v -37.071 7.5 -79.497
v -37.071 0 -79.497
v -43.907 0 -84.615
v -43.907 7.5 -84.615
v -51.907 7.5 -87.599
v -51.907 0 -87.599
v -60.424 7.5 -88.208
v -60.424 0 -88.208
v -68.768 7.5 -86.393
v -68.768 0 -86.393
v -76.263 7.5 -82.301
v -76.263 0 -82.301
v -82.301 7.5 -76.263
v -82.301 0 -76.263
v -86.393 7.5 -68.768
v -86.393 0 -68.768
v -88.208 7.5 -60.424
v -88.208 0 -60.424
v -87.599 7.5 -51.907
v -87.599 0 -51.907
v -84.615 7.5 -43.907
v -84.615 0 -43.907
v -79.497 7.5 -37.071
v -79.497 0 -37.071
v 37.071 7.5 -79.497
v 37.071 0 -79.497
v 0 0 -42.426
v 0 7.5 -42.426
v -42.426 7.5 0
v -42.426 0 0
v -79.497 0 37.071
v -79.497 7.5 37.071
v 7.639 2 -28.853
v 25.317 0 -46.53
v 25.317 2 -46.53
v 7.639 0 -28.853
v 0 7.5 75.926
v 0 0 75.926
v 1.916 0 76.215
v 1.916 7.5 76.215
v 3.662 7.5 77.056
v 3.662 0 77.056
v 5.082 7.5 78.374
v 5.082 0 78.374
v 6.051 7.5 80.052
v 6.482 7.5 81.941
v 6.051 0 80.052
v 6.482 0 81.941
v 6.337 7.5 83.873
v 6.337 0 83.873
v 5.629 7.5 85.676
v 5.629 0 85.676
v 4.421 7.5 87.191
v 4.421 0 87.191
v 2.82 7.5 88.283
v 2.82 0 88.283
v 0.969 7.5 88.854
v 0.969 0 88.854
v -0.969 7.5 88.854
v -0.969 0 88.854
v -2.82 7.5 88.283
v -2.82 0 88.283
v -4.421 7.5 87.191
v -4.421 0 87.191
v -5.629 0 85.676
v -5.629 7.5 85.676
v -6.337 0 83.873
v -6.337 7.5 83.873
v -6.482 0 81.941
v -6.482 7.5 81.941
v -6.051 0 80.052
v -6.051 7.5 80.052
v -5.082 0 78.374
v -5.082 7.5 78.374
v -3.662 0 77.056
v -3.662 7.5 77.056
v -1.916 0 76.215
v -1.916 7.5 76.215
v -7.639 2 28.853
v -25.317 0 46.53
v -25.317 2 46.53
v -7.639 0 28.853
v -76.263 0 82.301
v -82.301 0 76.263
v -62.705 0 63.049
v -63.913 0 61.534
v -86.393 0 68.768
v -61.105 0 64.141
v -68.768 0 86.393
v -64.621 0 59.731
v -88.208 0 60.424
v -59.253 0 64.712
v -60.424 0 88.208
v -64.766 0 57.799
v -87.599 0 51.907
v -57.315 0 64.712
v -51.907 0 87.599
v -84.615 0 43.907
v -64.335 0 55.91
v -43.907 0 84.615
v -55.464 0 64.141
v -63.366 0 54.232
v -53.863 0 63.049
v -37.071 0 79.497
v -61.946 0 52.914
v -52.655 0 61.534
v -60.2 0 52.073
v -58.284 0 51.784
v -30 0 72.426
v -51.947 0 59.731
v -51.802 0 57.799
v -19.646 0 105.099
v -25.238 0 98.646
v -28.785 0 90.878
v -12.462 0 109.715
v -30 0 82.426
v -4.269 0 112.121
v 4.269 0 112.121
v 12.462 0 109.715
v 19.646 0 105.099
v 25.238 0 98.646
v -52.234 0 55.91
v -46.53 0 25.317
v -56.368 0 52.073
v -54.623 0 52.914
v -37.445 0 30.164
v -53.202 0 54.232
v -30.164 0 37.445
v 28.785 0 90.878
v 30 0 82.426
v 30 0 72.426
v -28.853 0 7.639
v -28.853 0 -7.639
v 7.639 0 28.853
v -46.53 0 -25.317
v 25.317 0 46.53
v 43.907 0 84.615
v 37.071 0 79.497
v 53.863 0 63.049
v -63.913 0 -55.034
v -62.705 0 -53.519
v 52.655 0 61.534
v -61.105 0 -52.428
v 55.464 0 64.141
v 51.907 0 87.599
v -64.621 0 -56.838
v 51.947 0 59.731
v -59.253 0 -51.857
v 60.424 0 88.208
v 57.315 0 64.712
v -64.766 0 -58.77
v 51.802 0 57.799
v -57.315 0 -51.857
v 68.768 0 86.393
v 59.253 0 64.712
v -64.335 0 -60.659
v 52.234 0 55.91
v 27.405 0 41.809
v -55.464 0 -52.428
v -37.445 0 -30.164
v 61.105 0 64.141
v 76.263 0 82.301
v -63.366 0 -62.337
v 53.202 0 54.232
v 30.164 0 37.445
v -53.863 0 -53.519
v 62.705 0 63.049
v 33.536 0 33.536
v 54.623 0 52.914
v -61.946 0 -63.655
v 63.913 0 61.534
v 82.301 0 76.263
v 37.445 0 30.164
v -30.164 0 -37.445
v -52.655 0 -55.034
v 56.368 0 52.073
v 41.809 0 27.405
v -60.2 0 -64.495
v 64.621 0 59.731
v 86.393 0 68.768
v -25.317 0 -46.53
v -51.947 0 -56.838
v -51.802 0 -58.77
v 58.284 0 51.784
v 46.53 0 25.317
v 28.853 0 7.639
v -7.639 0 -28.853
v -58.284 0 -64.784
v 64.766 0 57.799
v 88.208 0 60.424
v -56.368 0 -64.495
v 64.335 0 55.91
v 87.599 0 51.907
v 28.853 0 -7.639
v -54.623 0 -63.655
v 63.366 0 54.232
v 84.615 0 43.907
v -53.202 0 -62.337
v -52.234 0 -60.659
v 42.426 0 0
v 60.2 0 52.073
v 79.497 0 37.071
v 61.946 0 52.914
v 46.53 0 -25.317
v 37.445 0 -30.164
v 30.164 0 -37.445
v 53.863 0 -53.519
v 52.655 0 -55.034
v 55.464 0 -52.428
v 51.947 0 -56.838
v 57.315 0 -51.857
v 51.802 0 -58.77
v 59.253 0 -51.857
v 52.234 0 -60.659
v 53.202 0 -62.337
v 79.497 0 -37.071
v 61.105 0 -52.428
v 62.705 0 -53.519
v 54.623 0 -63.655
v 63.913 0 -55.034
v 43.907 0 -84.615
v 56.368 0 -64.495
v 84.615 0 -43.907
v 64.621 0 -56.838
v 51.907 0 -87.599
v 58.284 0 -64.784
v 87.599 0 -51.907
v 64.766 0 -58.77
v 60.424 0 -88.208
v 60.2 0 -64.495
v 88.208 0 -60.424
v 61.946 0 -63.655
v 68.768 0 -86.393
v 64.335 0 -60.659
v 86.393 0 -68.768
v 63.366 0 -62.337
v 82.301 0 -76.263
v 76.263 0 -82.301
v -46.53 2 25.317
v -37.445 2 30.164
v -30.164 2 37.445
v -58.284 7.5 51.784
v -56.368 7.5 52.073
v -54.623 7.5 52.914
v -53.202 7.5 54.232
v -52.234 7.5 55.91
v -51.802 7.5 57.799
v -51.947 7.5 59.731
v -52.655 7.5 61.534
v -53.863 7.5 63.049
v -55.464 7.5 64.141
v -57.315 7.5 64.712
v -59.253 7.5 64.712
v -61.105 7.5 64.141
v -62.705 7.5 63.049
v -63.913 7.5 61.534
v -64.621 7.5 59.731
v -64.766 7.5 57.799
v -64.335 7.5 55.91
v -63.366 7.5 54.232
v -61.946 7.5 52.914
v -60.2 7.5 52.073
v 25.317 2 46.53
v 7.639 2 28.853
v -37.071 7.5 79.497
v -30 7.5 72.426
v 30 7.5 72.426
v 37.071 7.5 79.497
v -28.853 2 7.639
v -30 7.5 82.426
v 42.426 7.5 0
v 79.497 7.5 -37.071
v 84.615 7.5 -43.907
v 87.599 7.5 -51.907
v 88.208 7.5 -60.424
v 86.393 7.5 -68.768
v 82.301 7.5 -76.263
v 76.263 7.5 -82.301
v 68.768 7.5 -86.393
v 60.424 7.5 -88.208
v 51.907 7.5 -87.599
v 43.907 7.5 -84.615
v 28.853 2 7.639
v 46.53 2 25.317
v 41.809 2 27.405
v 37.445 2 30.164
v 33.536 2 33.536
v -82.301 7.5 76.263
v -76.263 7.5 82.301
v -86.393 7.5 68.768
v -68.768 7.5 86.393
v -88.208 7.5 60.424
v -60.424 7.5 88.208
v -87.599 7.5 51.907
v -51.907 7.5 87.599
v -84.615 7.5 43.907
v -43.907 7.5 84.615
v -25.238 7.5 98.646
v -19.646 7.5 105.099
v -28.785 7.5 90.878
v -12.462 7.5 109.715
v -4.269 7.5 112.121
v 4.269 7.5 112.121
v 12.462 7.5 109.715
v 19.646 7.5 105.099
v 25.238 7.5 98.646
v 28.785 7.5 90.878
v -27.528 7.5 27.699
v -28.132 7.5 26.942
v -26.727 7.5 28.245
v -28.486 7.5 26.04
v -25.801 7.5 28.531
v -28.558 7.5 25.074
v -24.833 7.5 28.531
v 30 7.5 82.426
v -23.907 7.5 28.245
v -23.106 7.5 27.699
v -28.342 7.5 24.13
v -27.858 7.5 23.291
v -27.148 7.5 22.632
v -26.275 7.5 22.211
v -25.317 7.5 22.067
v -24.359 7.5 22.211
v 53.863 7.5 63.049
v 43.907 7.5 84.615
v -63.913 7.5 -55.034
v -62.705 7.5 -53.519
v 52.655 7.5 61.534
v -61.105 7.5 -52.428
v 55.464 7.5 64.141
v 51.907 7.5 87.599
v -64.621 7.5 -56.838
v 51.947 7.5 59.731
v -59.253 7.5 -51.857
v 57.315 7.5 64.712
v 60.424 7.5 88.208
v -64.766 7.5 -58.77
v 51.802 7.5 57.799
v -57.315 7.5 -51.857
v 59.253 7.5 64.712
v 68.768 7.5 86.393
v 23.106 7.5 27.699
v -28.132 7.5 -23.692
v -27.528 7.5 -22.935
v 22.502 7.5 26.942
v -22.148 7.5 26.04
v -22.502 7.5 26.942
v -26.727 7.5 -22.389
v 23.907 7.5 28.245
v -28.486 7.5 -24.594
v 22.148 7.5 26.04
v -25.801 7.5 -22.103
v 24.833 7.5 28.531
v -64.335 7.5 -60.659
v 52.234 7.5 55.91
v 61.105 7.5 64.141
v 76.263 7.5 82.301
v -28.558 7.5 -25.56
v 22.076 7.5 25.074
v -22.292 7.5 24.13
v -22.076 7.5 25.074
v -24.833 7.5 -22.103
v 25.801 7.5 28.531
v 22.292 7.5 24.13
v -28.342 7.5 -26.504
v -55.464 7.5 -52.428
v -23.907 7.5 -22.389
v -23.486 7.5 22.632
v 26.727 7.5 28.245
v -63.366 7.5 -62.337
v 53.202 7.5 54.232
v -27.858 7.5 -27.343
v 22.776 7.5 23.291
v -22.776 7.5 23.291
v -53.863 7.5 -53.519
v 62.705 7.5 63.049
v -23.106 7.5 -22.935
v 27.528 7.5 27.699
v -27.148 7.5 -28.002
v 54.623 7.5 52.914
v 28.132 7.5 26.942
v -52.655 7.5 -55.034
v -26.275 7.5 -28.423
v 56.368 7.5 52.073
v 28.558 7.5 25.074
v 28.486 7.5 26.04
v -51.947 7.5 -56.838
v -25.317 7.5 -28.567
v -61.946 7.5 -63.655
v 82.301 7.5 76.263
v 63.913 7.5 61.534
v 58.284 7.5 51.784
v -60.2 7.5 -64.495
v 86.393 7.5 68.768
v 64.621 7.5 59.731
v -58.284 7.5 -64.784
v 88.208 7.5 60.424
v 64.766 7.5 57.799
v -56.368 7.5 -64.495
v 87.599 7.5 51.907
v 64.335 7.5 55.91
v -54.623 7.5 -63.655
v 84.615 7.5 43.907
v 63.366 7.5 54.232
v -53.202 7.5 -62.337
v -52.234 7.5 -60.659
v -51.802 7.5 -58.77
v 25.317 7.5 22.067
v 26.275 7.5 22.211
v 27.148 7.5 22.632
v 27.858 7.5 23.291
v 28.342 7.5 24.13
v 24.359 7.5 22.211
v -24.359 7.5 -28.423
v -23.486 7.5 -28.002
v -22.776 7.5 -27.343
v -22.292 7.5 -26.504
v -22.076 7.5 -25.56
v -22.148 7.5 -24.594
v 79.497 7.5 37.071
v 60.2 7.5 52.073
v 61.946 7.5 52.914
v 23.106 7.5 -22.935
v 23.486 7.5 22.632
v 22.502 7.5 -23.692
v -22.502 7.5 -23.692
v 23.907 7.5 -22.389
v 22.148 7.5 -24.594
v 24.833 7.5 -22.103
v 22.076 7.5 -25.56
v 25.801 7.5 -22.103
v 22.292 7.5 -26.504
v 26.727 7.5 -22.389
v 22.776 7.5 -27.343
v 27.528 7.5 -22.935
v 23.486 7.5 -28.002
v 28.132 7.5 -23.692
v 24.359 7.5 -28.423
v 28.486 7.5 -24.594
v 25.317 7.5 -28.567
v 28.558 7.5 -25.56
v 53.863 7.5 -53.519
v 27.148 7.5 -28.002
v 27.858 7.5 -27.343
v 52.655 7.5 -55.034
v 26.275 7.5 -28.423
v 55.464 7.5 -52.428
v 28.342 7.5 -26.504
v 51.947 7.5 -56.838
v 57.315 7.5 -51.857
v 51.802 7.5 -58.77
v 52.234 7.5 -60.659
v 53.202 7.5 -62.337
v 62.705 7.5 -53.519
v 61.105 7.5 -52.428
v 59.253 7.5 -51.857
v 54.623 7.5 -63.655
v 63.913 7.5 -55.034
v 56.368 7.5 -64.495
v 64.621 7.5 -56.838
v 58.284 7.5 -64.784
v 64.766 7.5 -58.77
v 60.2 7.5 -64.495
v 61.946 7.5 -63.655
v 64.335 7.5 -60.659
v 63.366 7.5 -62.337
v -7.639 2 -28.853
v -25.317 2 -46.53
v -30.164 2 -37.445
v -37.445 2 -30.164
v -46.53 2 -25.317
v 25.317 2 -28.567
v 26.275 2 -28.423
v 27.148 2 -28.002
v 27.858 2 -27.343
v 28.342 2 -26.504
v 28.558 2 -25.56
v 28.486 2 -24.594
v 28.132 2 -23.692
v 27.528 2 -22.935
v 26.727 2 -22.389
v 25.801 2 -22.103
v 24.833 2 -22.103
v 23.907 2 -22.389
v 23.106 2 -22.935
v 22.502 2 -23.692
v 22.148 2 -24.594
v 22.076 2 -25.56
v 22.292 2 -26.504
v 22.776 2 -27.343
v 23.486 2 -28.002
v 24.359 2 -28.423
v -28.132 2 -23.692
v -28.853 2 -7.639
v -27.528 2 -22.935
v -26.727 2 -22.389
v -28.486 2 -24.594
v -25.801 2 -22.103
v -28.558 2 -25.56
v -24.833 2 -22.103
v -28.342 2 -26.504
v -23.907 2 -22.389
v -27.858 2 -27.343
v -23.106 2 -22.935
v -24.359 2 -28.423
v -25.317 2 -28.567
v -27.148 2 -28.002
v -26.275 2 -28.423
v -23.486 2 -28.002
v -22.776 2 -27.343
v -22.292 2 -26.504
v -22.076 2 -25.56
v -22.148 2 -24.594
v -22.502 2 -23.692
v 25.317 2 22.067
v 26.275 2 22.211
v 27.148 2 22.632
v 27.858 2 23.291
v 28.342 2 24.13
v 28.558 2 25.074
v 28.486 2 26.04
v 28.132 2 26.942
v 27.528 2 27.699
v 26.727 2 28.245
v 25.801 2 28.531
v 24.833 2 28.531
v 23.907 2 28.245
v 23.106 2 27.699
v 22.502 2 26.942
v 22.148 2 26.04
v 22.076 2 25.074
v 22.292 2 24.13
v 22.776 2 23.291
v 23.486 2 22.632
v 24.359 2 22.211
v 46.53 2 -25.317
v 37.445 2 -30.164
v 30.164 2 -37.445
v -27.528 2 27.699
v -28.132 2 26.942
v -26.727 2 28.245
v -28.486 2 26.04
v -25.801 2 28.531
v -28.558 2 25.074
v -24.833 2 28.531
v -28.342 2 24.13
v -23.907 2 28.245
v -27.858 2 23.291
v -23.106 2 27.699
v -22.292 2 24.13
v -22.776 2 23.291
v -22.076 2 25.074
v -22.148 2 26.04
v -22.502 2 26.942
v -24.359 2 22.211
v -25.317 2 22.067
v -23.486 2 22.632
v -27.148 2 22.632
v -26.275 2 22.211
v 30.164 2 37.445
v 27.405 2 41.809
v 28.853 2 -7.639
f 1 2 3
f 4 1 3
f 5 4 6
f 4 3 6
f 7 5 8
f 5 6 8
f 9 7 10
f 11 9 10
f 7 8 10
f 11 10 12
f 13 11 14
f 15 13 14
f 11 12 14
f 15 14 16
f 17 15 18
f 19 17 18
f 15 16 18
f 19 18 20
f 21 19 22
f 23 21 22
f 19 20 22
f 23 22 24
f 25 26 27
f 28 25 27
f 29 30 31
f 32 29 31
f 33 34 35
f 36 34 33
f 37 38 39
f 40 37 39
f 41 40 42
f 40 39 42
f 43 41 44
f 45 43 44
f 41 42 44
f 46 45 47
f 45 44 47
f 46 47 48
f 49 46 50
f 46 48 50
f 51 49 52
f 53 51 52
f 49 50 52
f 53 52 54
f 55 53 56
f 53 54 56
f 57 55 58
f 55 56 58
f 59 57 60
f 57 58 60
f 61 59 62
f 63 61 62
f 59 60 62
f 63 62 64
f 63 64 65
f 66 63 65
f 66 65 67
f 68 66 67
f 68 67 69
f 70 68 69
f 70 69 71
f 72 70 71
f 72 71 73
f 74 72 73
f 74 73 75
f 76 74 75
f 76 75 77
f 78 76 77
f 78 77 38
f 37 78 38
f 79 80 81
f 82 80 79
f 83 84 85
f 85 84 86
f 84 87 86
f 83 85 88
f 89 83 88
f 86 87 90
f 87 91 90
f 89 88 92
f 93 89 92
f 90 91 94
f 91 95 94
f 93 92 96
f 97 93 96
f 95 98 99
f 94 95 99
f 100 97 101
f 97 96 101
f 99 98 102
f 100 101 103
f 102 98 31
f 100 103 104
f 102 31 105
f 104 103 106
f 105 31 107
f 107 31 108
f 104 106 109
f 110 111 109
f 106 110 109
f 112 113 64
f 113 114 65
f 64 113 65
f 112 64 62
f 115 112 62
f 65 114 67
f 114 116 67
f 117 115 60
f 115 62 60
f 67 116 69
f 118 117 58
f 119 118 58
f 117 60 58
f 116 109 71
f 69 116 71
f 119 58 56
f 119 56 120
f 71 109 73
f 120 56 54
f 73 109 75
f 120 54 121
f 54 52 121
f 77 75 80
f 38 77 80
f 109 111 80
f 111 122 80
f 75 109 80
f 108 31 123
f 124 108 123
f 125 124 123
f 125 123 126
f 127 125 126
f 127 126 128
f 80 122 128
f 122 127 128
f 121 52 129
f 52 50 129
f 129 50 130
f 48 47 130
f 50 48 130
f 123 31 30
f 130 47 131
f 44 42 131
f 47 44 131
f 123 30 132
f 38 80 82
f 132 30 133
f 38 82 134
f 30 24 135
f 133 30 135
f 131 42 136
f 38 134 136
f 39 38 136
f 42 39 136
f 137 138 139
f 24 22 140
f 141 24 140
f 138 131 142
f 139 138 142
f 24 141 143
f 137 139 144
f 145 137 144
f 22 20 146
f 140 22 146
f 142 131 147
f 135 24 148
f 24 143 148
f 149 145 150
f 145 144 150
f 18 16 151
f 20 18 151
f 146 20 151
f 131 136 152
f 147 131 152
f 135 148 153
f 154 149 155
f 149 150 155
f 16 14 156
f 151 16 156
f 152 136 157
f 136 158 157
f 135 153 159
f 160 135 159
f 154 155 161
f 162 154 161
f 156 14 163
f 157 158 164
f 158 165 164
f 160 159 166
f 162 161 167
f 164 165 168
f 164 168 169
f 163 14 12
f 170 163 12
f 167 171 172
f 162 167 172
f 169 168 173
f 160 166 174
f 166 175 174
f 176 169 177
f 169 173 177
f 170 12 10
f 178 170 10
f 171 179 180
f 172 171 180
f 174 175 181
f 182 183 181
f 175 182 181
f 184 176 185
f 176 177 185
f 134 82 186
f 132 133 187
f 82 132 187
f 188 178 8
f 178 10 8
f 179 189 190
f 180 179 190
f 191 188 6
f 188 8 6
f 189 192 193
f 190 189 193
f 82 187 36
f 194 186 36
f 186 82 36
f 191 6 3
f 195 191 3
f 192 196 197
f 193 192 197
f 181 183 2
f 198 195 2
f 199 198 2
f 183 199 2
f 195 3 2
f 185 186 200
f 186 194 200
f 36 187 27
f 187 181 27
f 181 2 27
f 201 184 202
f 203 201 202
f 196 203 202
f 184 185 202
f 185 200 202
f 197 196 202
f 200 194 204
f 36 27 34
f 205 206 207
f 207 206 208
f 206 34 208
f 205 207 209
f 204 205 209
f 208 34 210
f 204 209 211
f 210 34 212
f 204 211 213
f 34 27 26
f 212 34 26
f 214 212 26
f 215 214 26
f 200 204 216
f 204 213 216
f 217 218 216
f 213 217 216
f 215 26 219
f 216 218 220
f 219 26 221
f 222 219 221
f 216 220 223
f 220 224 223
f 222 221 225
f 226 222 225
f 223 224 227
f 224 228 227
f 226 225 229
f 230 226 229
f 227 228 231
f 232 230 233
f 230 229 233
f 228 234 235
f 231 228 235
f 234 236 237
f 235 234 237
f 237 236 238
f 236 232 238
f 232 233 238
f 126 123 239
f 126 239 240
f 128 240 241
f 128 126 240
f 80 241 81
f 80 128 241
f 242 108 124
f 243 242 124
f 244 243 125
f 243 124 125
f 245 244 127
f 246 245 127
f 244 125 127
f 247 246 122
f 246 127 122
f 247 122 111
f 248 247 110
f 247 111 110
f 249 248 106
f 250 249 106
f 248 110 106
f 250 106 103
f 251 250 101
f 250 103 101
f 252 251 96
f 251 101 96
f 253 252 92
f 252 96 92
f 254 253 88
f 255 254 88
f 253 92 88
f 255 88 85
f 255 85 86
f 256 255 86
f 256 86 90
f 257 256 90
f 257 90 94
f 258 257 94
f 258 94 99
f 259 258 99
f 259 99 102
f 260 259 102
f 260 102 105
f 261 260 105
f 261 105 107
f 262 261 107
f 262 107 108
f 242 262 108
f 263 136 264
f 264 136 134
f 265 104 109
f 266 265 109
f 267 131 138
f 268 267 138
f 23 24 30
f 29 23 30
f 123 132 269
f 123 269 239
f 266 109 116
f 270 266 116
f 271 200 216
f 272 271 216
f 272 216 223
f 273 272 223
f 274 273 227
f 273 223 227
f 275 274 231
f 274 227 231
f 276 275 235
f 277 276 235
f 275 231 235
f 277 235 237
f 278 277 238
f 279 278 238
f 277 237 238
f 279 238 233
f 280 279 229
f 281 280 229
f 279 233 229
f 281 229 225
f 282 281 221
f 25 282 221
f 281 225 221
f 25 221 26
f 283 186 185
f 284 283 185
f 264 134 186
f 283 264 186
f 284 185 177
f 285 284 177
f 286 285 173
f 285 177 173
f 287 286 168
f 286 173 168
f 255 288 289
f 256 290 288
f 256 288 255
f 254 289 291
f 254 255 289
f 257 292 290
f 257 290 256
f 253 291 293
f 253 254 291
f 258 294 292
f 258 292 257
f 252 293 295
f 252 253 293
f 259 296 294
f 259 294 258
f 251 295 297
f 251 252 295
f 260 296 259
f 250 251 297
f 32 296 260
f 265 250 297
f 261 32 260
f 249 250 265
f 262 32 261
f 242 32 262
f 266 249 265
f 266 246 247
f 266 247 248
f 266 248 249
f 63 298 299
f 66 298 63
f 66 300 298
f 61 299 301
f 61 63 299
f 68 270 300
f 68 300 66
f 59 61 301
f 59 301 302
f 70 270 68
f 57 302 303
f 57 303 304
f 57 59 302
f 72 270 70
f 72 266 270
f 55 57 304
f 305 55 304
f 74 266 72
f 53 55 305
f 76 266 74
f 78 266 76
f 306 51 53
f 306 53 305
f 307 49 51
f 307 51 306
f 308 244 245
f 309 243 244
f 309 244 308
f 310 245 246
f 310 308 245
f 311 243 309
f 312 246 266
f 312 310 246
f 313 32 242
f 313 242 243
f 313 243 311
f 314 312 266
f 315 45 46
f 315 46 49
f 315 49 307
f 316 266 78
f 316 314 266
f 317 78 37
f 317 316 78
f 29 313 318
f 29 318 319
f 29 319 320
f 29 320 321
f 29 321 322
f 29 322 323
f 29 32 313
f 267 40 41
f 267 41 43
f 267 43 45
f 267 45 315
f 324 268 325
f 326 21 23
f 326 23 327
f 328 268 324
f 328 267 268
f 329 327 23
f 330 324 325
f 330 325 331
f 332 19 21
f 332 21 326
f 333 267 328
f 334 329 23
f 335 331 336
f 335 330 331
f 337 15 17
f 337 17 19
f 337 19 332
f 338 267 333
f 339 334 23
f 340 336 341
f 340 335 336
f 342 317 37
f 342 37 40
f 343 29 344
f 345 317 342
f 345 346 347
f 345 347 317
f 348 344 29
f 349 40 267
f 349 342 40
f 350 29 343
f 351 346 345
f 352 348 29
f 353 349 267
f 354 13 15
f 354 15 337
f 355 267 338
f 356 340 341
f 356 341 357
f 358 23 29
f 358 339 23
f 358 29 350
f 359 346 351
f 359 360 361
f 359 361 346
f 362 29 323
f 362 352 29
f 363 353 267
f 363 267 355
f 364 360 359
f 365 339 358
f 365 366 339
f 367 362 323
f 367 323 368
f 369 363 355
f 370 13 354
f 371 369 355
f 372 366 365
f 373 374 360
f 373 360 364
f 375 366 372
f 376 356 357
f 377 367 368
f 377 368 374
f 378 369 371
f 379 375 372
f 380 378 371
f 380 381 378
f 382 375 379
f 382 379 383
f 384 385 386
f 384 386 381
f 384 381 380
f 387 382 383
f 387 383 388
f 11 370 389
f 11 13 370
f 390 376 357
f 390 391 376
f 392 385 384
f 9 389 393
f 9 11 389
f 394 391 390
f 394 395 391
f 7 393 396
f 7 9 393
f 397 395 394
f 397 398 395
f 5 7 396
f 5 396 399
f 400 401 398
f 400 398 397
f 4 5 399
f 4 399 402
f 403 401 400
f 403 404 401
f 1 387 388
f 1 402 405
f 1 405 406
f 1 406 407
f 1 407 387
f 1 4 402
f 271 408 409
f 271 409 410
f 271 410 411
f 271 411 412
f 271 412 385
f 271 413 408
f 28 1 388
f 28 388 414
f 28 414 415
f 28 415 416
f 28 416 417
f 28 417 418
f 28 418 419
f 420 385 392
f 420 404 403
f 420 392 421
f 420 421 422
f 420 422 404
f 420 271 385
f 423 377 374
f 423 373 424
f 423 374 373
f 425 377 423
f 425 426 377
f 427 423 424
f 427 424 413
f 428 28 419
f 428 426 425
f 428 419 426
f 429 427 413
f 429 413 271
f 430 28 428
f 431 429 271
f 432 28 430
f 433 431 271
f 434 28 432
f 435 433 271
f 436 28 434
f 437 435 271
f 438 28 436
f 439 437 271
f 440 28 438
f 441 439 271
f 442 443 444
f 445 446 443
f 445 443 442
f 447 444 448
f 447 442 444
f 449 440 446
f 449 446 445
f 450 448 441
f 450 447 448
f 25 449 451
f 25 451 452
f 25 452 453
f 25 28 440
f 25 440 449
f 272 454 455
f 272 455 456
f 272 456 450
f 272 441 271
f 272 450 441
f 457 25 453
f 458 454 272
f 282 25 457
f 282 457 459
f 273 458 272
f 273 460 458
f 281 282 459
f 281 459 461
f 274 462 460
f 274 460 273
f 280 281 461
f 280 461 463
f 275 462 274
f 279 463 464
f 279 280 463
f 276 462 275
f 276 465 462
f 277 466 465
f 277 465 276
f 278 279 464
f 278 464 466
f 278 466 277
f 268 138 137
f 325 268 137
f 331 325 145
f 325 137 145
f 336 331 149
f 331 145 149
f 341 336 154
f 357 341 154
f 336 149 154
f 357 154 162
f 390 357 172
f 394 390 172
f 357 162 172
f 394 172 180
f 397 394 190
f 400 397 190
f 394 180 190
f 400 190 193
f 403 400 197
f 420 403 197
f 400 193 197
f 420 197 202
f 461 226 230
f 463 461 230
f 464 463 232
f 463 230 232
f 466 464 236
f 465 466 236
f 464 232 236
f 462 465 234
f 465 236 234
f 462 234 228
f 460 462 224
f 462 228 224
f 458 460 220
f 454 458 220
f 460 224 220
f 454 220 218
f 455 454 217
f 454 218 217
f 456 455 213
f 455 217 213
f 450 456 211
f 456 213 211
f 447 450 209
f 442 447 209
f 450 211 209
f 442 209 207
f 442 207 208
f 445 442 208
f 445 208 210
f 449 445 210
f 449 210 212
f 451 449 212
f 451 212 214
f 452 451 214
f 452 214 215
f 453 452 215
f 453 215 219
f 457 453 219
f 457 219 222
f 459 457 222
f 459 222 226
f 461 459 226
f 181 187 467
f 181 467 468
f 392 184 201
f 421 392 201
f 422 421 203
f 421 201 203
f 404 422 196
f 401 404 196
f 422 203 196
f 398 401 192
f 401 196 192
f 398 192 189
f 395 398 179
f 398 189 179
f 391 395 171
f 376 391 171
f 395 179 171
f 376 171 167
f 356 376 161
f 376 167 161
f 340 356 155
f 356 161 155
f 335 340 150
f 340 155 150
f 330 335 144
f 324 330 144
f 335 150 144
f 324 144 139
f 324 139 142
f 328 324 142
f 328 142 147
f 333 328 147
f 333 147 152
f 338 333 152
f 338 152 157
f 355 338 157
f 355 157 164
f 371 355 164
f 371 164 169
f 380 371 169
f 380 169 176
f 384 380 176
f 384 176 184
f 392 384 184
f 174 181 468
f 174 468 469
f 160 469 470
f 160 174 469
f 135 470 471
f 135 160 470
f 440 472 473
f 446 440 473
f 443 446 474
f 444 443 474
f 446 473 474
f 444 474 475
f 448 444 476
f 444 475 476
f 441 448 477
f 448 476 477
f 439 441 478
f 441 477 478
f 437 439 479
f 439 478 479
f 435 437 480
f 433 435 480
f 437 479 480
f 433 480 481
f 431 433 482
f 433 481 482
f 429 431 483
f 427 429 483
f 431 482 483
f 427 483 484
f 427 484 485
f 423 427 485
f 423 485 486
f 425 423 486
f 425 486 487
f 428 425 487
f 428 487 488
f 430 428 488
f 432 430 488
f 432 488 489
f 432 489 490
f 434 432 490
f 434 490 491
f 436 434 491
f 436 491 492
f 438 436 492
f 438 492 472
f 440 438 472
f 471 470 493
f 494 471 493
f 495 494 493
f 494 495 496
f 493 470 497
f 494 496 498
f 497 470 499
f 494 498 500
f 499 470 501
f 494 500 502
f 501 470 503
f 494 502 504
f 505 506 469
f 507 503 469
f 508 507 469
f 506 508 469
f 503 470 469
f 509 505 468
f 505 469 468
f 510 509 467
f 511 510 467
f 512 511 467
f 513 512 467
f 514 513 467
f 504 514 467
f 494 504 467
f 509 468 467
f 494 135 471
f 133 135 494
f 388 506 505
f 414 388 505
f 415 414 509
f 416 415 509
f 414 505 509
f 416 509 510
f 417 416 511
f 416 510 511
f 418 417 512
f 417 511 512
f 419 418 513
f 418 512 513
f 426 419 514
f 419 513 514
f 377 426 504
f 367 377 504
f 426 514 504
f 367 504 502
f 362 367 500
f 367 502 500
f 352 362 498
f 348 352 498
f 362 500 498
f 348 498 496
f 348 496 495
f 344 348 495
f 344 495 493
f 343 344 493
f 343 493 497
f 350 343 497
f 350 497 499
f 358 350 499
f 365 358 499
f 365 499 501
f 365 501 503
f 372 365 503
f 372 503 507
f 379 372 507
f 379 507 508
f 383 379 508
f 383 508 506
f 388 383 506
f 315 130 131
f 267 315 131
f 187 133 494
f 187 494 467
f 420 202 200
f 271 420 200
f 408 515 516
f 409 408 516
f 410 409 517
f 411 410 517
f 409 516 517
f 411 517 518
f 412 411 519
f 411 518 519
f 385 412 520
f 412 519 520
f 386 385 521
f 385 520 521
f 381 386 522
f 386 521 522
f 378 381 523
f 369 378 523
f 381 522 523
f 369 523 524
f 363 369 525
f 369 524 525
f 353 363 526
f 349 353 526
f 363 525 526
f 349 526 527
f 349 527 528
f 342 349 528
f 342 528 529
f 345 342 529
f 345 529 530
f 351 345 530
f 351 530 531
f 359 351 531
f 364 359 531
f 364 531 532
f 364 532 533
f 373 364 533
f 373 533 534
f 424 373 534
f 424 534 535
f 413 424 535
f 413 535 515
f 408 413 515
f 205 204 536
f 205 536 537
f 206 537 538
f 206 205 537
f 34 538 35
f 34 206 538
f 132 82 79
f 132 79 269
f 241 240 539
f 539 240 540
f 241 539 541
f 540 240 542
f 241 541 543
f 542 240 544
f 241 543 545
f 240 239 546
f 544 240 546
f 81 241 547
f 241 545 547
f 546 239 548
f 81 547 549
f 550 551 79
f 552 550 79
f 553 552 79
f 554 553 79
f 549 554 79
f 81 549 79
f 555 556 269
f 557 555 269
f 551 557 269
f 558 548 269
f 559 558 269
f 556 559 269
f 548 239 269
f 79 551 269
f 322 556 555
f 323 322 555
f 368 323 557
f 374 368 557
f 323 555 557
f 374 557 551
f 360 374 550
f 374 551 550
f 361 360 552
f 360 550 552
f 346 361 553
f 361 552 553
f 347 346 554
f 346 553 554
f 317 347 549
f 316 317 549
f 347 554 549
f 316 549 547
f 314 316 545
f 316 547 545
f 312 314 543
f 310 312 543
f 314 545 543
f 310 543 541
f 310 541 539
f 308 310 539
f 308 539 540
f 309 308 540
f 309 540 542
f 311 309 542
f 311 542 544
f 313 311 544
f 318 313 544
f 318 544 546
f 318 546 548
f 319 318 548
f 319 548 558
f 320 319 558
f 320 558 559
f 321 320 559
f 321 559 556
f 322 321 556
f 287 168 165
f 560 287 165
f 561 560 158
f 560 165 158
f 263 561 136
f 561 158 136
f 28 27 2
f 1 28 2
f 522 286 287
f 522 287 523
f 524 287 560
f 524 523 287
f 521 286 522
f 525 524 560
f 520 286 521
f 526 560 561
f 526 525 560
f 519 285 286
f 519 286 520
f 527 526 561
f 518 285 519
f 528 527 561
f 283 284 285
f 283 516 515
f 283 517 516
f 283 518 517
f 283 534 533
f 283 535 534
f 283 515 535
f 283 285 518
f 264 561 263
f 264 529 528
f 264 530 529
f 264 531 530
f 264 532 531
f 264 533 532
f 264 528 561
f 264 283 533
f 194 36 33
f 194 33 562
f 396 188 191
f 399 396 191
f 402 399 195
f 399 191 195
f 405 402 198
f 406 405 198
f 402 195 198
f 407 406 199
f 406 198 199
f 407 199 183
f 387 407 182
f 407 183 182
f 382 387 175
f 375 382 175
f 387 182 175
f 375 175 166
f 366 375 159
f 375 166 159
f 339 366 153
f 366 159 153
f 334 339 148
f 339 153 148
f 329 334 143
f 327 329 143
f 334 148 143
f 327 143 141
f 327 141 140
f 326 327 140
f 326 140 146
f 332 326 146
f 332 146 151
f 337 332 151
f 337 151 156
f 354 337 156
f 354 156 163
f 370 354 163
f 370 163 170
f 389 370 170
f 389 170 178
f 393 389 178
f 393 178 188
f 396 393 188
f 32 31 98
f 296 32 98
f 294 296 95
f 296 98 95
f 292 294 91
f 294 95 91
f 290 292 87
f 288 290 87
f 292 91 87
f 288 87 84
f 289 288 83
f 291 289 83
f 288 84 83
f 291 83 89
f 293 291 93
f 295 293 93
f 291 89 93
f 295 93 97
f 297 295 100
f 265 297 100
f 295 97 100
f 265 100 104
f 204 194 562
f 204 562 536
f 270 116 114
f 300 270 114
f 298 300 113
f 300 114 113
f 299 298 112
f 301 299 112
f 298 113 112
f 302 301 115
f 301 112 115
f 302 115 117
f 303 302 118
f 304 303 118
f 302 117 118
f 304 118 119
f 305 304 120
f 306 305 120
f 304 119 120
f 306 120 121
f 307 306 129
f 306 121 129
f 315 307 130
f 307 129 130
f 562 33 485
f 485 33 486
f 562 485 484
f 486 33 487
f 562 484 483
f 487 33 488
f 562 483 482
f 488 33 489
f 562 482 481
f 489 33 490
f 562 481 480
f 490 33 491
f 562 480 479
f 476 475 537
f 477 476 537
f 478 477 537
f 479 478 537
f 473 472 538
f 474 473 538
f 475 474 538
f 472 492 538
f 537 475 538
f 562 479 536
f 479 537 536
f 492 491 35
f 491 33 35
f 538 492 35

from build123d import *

# Parameters (mm, degrees)
BOSS_EXTRU_1_DEPTH      = 7.5
ENL_V_MAT_EXTRU_1_DEPTH = 2
ESQUISSE5_R             = 3.25
ENL_V_MAT_EXTRU_2_DEPTH = 144.052645944
ESQUISSE7_R             = 6.5
ENL_V_MAT_EXTRU_3_DEPTH = 144.143492733


with BuildPart() as part:
    # Esquisse2 → Boss.-Extru.1 (new body)
    with BuildSketch(Plane(origin=(0, 0, 0), x_dir=(1, 0, 0), z_dir=(0, 1, 0))):
        with BuildLine():
            Line((79.497474683, -37.071067812), (42.426406871, 0))
            Line((42.426406871, 0), (79.497474683, 37.071067812))
            ThreePointArc((79.497474683, 37.071067812), (79.497474683, 79.497474683), (37.071067812, 79.497474683))
            Line((37.071067812, 79.497474683), (0, 42.426406871))
            Line((0, 42.426406871), (-37.071067812, 79.497474683))
            ThreePointArc((-37.071067812, 79.497474683), (-79.497474683, 79.497474683), (-79.497474683, 37.071067812))
            Line((-79.497474683, 37.071067812), (-42.426406871, 0))
            Line((-42.426406871, 0), (-79.497474683, -37.071067812))
            ThreePointArc((-79.497474683, -37.071067812), (-79.497474683, -79.497474683), (-37.071067812, -79.497474683))
            Line((-37.071067812, -79.497474683), (-30, -72.426406871))
            Line((-30, -72.426406871), (-30, -82.426406871))
            ThreePointArc((-30, -82.426406871), (0, -112.426406871), (30, -82.426406871))
            Line((30, -82.426406871), (30, -72.426406871))
            Line((30, -72.426406871), (37.071067812, -79.497474683))
            ThreePointArc((37.071067812, -79.497474683), (79.497474683, -79.497474683), (79.497474683, -37.071067812))
        make_face()
    extrude(amount=BOSS_EXTRU_1_DEPTH)

    # Esquisse4 → Enlèv. mat.-Extru.1 (cut)
    with BuildSketch(Plane(origin=(0, 0, 0), x_dir=(-1, 0, 0), z_dir=(0, -1, 0))):
        with BuildLine():
            Line((-33.535533906, -33.535533906), (-18.245921943, -18.245921943))
            Line((-18.245921943, -18.245921943), (-28.852523661, -7.639320225))
            Line((-28.852523661, -7.639320225), (-46.53019319, -25.316989755))
            ThreePointArc((-46.53019319, -25.316989755), (-39.575984314, -28.703872332), (-33.535533906, -33.535533906))
        make_face()
        with BuildLine():
            Line((-7.639320225, -28.852523661), (-18.245921943, -18.245921943))
            Line((-18.245921943, -18.245921943), (-33.535533906, -33.535533906))
            ThreePointArc((-33.535533906, -33.535533906), (-28.703872332, -39.575984314), (-25.316989755, -46.53019319))
            Line((-25.316989755, -46.53019319), (-7.639320225, -28.852523661))
        make_face()
        with BuildLine():
            ThreePointArc((-46.53019319, 25.316989755), (-33.535533906, 33.535533906), (-25.316989755, 46.53019319))
            Line((-25.316989755, 46.53019319), (-7.639320225, 28.852523661))
            Line((-7.639320225, 28.852523661), (-28.852523661, 7.639320225))
            Line((-28.852523661, 7.639320225), (-46.53019319, 25.316989755))
        make_face()
        with BuildLine():
            ThreePointArc((25.316989755, 46.53019319), (33.535533906, 33.535533906), (46.53019319, 25.316989755))
            Line((46.53019319, 25.316989755), (28.852523661, 7.639320225))
            Line((28.852523661, 7.639320225), (7.639320225, 28.852523661))
            Line((7.639320225, 28.852523661), (25.316989755, 46.53019319))
        make_face()
        with BuildLine():
            ThreePointArc((46.53019319, -25.316989755), (33.535533906, -33.535533906), (25.316989755, -46.53019319))
            Line((25.316989755, -46.53019319), (7.639320225, -28.852523661))
            Line((7.639320225, -28.852523661), (28.852523661, -7.639320225))
            Line((28.852523661, -7.639320225), (46.53019319, -25.316989755))
        make_face()
    extrude(amount=-ENL_V_MAT_EXTRU_1_DEPTH, mode=Mode.SUBTRACT)

    # Esquisse5 → Enlèv. mat.-Extru.2 (cut, through all)
    with BuildSketch(Plane(origin=(0, 2, 0), x_dir=(-1, 0, 0), z_dir=(0, -1, 0))):
        with Locations(Location((-25.316989755, -25.316989755, 0), (0, 0, 90))):
            Circle(ESQUISSE5_R)
        with Locations(Location((-25.316989755, 25.316989755, 0), (0, 0, 90))):
            Circle(ESQUISSE5_R)
        with Locations(Location((25.316989755, 25.316989755, 0), (0, 0, 90))):
            Circle(ESQUISSE5_R)
        with Locations(Location((25.316989755, -25.316989755, 0), (0, 0, 90))):
            Circle(ESQUISSE5_R)
    extrude(amount=-ENL_V_MAT_EXTRU_2_DEPTH, mode=Mode.SUBTRACT)

    # Esquisse7 → Enlèv. mat.-Extru.3 (cut, through all)
    with BuildSketch(Plane(origin=(0, 0, 0), x_dir=(-1, 0, 0), z_dir=(0, -1, 0))):
        with Locations(Location((0, -82.426406871, 0), (0, 0, 90))):
            Circle(ESQUISSE7_R)
        with Locations(Location((-58.284271247, -58.284271247, 0), (0, 0, 90))):
            Circle(ESQUISSE7_R)
        with Locations(Location((-58.284271247, 58.284271247, 0), (0, 0, 90))):
            Circle(ESQUISSE7_R)
        with Locations(Location((58.284271247, 58.284271247, 0), (0, 0, 90))):
            Circle(ESQUISSE7_R)
        with Locations(Location((58.284271247, -58.284271247, 0), (0, 0, 90))):
            Circle(ESQUISSE7_R)
    extrude(amount=-ENL_V_MAT_EXTRU_3_DEPTH, mode=Mode.SUBTRACT)


solid = part.part
